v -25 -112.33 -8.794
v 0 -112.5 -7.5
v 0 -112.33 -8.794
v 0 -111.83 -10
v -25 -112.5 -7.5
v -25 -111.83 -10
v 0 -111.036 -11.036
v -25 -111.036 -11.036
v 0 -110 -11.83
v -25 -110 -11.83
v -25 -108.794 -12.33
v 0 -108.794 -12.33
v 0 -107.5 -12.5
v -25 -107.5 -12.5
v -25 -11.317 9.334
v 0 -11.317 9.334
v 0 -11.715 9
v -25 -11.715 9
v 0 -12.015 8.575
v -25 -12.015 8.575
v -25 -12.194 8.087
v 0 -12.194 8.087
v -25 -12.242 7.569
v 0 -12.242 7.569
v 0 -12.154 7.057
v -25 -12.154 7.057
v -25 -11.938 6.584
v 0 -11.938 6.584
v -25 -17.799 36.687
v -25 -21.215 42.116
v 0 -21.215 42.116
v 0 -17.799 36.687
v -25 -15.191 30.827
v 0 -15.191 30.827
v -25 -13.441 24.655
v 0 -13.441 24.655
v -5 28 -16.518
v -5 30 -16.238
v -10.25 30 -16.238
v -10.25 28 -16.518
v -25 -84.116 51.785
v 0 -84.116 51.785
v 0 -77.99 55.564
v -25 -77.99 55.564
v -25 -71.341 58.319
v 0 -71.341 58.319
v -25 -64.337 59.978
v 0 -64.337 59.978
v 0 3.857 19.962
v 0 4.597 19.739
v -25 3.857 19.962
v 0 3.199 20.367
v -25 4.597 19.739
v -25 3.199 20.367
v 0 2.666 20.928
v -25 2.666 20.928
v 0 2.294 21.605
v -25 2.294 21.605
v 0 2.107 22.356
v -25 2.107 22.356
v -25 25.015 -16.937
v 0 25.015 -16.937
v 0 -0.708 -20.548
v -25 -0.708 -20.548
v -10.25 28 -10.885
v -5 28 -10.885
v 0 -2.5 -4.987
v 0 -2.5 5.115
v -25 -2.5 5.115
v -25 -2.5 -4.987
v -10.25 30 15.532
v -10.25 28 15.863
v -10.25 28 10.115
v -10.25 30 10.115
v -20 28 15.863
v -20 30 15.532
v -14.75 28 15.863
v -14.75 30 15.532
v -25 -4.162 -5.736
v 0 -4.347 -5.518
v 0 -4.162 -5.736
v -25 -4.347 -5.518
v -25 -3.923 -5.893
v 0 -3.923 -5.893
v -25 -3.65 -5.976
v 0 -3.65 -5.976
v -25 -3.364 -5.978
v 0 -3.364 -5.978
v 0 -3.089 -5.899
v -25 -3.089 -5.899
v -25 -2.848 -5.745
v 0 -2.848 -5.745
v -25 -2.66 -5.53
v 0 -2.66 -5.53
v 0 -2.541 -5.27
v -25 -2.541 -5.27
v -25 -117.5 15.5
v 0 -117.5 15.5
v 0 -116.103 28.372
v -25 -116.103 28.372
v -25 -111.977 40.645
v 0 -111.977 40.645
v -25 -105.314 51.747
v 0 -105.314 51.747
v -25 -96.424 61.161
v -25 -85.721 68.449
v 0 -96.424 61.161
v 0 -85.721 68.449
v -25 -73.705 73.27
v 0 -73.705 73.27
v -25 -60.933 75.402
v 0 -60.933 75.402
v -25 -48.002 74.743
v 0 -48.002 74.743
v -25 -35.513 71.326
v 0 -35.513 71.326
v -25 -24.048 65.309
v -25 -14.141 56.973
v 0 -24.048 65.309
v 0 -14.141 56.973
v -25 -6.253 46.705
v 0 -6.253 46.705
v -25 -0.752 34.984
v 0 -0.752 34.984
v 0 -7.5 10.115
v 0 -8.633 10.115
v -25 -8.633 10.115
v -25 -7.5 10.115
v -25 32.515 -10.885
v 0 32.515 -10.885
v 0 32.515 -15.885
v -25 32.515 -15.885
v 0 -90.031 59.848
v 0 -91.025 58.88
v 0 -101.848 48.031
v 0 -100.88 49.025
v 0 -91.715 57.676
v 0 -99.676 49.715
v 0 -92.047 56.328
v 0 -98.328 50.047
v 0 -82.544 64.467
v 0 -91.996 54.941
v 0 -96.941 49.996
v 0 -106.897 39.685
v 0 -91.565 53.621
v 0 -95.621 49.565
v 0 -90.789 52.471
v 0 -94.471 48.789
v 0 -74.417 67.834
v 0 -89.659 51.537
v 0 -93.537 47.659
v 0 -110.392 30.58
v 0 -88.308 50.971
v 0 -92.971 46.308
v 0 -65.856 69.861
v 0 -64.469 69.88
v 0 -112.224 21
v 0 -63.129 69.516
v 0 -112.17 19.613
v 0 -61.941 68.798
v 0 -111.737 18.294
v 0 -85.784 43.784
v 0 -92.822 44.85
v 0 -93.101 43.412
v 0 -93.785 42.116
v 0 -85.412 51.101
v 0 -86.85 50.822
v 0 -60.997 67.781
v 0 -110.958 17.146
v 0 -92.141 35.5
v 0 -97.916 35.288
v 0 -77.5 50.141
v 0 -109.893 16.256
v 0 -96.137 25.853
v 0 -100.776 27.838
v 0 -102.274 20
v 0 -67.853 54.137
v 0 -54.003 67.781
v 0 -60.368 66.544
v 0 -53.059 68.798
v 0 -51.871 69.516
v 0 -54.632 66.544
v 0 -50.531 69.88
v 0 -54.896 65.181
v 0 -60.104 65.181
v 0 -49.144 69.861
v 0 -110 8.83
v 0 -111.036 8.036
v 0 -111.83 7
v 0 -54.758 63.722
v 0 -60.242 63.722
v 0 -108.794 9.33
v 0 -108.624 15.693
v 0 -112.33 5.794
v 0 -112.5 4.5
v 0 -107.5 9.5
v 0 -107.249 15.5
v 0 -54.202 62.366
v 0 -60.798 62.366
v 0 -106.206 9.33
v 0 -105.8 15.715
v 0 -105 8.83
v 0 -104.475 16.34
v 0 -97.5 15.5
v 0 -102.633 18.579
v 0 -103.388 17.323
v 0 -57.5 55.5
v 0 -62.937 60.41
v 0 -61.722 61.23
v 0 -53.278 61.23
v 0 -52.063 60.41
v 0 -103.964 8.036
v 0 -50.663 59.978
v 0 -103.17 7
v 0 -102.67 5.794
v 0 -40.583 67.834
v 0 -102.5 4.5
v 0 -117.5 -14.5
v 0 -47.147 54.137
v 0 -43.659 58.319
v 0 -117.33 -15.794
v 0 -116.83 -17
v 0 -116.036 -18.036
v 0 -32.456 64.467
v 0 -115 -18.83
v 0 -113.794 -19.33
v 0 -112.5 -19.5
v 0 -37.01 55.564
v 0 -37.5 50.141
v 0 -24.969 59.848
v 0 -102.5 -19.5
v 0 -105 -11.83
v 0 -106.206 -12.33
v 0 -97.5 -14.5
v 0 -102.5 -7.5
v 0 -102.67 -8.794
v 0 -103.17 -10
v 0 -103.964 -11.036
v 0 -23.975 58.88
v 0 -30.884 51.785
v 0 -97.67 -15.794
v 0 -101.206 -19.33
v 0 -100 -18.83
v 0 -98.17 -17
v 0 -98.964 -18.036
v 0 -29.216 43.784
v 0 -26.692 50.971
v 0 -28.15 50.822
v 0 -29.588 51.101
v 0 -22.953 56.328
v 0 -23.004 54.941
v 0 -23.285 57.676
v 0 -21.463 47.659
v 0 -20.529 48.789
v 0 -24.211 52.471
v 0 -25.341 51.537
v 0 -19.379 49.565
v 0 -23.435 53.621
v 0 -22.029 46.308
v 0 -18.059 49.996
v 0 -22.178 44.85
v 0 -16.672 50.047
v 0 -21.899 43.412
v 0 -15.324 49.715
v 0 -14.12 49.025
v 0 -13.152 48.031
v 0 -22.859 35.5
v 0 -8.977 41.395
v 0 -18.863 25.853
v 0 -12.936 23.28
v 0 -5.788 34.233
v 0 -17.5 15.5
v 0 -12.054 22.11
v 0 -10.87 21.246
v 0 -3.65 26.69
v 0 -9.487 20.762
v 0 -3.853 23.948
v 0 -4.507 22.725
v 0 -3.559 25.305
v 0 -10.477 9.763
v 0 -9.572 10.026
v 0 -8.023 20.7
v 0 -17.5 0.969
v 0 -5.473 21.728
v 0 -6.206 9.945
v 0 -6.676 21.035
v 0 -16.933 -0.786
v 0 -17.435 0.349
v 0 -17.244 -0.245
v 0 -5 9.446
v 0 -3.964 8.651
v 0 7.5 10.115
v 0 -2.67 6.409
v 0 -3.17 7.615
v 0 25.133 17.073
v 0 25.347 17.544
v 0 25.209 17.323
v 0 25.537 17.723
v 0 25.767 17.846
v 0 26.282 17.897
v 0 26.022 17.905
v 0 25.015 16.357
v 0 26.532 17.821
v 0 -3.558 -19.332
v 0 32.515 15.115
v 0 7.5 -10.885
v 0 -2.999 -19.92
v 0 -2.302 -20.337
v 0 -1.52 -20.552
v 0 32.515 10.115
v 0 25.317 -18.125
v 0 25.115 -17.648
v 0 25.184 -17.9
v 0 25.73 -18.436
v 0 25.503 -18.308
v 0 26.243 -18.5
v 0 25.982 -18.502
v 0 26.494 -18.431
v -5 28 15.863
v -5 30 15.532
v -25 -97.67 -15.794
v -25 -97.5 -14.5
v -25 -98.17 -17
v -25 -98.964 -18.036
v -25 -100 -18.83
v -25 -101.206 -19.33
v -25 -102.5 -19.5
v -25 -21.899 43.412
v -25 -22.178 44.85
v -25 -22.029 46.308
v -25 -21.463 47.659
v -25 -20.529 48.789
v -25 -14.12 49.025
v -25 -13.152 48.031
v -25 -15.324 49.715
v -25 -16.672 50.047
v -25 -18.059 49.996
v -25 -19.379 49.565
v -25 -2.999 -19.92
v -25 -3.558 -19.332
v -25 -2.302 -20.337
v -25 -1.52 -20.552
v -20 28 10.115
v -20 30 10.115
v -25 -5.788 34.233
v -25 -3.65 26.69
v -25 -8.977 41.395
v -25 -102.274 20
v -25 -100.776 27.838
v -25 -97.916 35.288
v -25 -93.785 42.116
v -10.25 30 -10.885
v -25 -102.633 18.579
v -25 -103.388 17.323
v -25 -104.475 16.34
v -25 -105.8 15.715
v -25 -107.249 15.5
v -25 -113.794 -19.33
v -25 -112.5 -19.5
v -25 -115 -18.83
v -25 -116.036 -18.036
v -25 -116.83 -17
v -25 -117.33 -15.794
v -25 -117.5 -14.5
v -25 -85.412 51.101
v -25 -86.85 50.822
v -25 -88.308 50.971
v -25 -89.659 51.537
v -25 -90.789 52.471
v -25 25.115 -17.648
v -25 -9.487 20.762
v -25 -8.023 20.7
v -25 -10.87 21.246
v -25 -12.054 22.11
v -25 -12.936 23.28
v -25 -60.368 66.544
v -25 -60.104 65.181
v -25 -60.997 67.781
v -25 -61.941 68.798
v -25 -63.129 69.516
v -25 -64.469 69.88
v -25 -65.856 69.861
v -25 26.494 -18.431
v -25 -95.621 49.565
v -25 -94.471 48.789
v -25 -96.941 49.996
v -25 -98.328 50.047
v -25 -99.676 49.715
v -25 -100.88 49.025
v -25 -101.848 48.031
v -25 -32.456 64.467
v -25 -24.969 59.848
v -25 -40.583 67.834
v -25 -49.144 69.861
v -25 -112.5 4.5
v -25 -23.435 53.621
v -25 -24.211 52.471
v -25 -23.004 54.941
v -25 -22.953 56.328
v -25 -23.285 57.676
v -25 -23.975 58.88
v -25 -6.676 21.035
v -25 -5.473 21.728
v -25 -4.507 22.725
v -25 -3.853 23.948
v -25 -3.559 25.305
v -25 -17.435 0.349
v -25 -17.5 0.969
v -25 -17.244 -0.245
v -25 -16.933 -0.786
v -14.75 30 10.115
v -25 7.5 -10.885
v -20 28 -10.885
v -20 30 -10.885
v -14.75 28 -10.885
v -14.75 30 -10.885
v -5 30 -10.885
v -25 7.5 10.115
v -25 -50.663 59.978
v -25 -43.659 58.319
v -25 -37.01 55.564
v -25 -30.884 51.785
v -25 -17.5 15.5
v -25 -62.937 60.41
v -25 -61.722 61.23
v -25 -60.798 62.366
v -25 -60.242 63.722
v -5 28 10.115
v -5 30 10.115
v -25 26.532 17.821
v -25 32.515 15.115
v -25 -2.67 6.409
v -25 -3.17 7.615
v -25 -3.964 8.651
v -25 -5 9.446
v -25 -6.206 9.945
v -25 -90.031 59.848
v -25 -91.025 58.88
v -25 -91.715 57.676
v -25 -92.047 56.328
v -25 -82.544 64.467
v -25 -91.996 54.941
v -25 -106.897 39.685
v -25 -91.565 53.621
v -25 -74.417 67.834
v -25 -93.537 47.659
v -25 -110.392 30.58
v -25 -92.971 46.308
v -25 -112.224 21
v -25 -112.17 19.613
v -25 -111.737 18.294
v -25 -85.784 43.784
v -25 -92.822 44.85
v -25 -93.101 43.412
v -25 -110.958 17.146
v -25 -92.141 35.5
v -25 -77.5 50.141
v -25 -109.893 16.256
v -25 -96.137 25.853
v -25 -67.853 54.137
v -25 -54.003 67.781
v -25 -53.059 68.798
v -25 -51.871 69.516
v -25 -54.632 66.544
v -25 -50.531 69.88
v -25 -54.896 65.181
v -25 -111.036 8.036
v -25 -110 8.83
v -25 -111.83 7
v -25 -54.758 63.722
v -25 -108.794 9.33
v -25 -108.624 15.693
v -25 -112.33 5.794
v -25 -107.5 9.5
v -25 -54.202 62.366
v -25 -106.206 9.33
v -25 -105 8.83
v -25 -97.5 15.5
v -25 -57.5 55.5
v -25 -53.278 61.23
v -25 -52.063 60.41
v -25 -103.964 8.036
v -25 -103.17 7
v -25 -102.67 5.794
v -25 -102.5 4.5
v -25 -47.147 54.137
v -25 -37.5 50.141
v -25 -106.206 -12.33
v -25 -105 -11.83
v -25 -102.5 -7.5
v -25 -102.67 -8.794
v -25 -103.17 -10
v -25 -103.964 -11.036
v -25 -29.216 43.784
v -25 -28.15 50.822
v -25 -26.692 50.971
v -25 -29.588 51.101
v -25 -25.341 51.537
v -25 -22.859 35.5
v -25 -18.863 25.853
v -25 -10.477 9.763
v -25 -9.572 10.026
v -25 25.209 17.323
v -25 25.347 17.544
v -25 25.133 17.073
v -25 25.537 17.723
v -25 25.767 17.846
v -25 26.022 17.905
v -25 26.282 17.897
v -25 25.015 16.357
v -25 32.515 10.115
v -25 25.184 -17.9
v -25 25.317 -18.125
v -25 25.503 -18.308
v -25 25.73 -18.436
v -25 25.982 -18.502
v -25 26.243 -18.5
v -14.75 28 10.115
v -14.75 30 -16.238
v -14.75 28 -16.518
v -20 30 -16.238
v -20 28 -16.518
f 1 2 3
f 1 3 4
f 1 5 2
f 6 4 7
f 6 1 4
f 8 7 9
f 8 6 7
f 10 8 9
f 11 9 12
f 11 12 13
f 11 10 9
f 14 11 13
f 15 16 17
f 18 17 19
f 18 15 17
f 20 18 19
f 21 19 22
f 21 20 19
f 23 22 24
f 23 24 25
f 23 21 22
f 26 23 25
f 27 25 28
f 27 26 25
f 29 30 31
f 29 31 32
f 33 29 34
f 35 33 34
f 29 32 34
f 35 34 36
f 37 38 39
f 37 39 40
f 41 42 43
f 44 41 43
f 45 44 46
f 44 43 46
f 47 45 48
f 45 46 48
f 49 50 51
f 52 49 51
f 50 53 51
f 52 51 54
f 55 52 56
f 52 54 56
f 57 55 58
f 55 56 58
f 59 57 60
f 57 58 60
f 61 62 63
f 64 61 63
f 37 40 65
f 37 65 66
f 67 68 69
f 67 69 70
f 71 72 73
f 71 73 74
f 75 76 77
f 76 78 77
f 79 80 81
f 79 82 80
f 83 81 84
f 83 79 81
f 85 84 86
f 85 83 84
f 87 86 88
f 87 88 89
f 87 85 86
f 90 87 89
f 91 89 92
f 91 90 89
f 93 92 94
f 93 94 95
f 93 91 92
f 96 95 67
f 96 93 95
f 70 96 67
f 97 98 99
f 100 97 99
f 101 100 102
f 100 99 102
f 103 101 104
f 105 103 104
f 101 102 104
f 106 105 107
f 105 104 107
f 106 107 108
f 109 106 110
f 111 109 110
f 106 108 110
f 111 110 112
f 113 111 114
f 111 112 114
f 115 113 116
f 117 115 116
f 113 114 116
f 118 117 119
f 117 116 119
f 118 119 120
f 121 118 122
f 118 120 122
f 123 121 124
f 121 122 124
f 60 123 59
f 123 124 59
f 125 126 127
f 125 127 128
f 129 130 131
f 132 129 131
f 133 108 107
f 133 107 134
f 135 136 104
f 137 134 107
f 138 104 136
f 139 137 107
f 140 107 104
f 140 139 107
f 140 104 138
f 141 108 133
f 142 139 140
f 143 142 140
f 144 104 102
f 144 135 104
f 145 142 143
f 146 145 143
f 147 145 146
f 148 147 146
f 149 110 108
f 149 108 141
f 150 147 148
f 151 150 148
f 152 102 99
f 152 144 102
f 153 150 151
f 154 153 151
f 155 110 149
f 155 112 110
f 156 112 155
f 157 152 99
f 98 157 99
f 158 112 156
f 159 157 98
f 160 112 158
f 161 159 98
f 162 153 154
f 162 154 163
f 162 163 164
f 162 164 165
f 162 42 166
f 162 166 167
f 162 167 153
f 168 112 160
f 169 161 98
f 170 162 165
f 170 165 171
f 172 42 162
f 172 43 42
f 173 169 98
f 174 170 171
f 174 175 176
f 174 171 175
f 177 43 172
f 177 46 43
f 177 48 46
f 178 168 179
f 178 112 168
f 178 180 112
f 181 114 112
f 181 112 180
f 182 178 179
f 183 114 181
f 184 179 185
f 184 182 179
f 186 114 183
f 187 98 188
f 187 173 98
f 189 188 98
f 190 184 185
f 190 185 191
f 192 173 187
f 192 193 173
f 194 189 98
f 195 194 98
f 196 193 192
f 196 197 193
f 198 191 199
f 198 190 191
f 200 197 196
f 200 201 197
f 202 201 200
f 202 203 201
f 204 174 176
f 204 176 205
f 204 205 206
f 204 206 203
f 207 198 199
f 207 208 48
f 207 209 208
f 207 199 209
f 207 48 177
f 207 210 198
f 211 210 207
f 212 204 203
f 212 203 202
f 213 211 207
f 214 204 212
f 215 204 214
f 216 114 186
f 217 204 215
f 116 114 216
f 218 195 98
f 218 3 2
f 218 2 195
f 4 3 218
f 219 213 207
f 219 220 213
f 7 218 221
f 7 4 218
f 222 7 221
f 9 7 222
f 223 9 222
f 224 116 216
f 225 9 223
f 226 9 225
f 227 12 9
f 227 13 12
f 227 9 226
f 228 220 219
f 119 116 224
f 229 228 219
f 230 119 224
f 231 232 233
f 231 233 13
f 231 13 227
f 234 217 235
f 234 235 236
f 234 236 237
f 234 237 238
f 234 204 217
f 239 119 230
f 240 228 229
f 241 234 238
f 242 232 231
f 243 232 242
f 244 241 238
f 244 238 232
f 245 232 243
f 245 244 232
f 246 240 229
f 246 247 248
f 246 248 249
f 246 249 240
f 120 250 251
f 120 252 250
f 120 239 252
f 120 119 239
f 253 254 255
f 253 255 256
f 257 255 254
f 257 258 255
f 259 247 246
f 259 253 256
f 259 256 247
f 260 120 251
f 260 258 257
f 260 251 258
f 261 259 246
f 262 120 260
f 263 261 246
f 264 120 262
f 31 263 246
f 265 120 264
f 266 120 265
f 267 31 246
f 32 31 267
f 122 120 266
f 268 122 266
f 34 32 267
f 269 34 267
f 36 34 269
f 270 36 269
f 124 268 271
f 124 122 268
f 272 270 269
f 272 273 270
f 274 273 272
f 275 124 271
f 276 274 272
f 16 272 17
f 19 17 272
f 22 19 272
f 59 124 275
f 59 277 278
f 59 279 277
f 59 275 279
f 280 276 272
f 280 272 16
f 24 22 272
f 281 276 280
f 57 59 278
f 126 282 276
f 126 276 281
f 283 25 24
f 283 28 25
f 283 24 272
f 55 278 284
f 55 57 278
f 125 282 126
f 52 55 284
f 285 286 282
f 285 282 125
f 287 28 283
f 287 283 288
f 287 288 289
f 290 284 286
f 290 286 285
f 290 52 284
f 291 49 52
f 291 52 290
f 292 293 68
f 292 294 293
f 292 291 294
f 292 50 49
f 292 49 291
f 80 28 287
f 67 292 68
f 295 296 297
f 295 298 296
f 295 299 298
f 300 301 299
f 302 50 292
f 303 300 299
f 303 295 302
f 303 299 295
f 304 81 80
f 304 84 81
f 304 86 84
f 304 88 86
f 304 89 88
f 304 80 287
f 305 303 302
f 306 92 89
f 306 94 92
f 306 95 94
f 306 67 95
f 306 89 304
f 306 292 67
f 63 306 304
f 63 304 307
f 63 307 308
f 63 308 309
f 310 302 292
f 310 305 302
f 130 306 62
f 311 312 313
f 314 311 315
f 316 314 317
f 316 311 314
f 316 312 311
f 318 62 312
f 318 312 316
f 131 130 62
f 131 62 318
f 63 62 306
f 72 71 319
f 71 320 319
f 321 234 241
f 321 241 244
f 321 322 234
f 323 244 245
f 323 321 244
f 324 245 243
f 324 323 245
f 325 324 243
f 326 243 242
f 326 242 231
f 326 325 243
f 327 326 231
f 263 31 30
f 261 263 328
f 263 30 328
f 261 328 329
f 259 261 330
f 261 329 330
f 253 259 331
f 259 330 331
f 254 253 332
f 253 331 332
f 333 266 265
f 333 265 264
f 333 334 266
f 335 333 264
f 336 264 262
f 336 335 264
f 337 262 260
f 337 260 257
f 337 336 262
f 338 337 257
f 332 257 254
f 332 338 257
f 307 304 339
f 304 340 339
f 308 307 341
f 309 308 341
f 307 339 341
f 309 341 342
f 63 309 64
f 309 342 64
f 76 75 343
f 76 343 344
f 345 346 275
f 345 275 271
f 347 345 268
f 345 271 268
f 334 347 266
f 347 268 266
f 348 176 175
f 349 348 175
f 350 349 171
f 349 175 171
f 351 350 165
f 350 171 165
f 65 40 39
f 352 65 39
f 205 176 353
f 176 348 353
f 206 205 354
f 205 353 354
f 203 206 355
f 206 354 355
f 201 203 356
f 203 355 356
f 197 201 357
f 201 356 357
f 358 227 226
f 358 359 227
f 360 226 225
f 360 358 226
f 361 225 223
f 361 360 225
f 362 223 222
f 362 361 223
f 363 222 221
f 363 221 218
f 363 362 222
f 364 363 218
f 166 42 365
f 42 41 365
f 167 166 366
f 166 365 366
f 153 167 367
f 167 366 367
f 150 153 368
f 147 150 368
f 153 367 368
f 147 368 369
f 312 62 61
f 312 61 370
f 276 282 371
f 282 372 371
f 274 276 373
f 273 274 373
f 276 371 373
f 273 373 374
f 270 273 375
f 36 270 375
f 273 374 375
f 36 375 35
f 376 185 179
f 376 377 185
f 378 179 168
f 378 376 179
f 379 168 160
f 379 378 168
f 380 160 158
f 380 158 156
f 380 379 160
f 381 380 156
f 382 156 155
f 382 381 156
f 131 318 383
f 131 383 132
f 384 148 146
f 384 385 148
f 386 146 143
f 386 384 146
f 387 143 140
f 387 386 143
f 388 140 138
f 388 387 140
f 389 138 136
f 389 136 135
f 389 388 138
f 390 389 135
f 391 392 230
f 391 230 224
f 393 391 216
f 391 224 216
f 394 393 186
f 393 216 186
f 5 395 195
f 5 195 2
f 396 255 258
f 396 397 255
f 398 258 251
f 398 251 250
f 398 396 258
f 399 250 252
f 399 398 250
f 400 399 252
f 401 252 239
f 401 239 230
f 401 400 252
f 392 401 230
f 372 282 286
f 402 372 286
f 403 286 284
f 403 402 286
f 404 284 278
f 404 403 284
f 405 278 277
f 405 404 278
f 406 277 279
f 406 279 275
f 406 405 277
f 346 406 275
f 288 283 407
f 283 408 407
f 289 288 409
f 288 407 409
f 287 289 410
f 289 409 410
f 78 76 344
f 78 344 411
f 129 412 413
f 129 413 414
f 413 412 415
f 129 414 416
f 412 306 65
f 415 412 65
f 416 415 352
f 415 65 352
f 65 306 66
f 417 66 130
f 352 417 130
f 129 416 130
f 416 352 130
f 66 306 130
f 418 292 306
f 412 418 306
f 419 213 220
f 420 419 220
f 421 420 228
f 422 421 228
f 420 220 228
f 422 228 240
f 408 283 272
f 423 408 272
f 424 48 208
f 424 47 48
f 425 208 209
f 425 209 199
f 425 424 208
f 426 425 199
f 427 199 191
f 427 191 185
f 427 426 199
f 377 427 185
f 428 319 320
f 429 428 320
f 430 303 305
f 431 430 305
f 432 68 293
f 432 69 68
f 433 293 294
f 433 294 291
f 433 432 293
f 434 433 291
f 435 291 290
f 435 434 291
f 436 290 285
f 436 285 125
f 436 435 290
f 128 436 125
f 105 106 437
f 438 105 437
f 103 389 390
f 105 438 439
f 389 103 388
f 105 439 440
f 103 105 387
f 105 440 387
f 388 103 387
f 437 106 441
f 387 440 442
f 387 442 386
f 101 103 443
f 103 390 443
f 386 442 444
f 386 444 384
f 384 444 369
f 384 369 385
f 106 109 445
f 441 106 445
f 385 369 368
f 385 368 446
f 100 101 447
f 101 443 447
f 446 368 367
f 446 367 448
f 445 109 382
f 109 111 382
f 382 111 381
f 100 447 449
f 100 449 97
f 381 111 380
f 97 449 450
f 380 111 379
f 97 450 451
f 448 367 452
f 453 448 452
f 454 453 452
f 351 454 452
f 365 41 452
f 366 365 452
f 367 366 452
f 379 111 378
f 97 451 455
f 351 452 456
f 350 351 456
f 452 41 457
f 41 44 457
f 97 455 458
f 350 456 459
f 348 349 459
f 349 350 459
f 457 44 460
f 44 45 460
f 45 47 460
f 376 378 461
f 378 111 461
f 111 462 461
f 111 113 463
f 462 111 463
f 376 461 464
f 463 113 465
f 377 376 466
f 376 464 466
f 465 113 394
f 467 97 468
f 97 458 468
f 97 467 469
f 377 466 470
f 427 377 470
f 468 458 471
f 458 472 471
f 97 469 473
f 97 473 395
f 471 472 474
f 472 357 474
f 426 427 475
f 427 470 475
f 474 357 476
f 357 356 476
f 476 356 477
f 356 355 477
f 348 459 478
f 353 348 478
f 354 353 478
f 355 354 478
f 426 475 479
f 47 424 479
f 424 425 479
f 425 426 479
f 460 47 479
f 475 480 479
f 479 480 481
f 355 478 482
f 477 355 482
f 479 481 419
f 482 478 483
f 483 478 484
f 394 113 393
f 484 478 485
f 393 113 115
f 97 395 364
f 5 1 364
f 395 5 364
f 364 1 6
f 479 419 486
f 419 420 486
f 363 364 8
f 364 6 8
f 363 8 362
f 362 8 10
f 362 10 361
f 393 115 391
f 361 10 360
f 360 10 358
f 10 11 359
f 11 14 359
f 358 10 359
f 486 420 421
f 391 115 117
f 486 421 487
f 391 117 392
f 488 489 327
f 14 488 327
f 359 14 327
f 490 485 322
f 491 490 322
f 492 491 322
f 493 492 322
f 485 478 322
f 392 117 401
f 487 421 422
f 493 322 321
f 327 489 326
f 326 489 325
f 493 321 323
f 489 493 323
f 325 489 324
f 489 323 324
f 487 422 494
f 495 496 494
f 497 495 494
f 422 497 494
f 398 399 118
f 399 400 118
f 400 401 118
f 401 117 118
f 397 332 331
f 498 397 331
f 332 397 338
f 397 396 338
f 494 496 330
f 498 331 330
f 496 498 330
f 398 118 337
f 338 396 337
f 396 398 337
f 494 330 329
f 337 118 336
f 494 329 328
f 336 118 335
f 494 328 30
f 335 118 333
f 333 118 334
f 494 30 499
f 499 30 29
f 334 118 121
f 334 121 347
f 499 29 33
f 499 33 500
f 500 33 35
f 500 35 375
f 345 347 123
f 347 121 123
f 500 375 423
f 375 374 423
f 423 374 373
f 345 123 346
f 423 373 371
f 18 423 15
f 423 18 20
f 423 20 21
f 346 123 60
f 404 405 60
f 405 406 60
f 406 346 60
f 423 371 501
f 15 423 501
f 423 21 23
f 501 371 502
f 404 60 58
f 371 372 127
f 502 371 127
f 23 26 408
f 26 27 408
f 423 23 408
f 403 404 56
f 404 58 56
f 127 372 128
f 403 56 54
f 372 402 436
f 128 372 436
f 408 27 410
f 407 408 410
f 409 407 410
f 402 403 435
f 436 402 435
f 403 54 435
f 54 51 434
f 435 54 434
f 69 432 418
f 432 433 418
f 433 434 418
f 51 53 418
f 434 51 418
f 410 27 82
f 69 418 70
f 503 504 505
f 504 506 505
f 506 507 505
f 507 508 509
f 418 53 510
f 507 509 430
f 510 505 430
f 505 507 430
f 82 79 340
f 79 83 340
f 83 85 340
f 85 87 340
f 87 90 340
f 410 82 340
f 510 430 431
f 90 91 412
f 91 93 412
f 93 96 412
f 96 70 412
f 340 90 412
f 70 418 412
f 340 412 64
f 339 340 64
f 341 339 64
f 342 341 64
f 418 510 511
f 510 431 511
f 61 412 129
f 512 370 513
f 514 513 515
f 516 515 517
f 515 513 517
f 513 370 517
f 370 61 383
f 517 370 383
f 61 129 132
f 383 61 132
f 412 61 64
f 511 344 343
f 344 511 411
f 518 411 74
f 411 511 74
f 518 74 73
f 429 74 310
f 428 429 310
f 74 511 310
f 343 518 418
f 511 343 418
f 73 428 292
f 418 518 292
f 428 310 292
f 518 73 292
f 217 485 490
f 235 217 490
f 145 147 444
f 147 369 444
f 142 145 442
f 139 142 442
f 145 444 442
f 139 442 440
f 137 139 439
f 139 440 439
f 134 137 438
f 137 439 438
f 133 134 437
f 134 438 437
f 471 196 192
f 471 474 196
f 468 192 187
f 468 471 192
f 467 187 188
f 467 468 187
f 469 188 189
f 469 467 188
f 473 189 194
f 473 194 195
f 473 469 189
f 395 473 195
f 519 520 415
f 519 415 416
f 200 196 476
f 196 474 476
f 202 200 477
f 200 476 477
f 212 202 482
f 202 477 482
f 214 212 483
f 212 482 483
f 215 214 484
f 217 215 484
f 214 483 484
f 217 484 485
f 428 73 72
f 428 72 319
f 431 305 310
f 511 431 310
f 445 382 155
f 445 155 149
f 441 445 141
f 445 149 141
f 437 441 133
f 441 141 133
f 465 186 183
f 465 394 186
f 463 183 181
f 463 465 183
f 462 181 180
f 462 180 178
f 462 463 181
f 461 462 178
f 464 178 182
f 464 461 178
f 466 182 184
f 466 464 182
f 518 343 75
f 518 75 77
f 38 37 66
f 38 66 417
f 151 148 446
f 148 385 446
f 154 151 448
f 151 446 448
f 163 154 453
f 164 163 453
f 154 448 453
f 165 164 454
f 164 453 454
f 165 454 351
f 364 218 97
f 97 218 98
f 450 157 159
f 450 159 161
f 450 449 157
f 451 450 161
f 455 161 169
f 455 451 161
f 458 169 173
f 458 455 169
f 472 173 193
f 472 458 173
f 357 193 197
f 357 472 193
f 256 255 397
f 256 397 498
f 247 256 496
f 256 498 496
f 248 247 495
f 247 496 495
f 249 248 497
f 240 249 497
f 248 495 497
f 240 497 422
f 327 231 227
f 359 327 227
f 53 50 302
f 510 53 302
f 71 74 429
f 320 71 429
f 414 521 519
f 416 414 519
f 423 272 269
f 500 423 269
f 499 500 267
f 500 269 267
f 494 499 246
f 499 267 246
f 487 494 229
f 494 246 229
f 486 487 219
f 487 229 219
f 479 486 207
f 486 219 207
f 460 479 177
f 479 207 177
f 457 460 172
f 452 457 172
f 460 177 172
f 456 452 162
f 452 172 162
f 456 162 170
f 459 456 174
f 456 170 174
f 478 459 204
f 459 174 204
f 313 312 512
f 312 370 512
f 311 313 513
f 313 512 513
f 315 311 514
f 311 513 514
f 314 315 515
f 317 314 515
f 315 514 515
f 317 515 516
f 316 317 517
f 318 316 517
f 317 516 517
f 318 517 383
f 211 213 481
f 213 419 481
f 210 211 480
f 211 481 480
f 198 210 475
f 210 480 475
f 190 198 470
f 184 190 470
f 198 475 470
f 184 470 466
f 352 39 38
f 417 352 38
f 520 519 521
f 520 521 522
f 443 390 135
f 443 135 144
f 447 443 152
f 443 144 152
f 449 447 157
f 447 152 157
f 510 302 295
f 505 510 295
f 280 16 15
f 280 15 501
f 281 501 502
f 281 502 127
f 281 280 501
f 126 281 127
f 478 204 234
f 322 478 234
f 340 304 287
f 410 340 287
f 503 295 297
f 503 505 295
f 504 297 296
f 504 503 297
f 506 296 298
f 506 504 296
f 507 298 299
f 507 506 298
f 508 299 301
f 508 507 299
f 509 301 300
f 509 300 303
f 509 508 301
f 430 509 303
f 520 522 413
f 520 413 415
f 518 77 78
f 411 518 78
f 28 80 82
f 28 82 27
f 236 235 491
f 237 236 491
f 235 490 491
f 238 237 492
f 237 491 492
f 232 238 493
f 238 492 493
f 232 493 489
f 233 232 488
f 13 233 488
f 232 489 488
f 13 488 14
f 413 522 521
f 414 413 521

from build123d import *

# Parameters (mm, degrees)
SKETCH1_W               = 22
SKETCH1_H               = 10
BOSS_EXTRUDE1_DEPTH     = 25
FILLET1_R               = 5
FILLET2_R               = 5
FILLET3_R               = 5
FILLET4_R               = 5
FILLET5_R               = 2
FILLET6_R               = 1
FILLET7_R               = 3
FILLET8_R               = 5
CUT_EXTRUDE1_DEPTH      = 35
CUT_EXTRUDE1_DEPTH_BACK = 25
SKETCH2_W               = 5.25
SKETCH2_H               = 2
BOSS_EXTRUDE2_DEPTH     = 25
FILLET9_R               = 1


# Some blends are built 0.0001 mm under size
with BuildPart() as part:
    # Sketch1 → Boss-Extrude1 (new body)
    with BuildSketch(Plane(origin=(0, 0, 0), x_dir=(0, 0, -1), z_dir=(1, 0, 0))):
        with BuildLine():
            ThreePointArc((-15.5, -17.5), (-55.5, -57.5), (-15.5, -97.5))
            Line((-15.5, -97.5), (19.5, -97.5))
            Line((19.5, -97.5), (19.5, -117.5))
            Line((19.5, -117.5), (-15.5, -117.5))
            ThreePointArc((-15.5, -117.5), (-75.455538985, -59.809403615), (-20.115384615, 2.322221831))
            Line((-20.115384615, 2.322221831), (-15.115384615, 32.514814847))
            Line((-15.115384615, 32.514814847), (-10.115384615, 32.514814847))
            Line((-10.115384615, 32.514814847), (-10.115384615, 7.5))
            Line((-10.115384615, 7.5), (10.884615385, 7.5))
            Line((10.884615385, 7.5), (10.884615385, 32.514814847))
            Line((10.884615385, 32.514814847), (15.884615385, 32.514814847))
            Line((15.884615385, 32.514814847), (20.8, -2.5))
            Line((20.8, -2.5), (0, -17.5))
            Line((0, -17.5), (-15.5, -17.5))
        make_face()
        with BuildLine():
            ThreePointArc((-52.30218335, -98.372965401), (-35.210237225, -108.846923457), (-15.5, -112.5))
            Line((-15.5, -112.5), (-15.5, -102.5))
            ThreePointArc((-15.5, -102.5), (-31.62655773, -99.511119192), (-45.610877286, -90.941517146))
            Line((-45.610877286, -90.941517146), (-52.30218335, -98.372965401))
        make_face(mode=Mode.SUBTRACT)
        with BuildLine():
            ThreePointArc((-56.372965401, -20.69781665), (-66.313374288, -36.45241122), (-70.424624412, -54.621522407))
            Line((-70.424624412, -54.621522407), (-60.438329064, -55.144881969))
            ThreePointArc((-60.438329064, -55.144881969), (-57.074578963, -40.279245544), (-48.941517146, -27.389122714))
            Line((-48.941517146, -27.389122714), (-56.372965401, -20.69781665))
        make_face(mode=Mode.SUBTRACT)
        with BuildLine():
            ThreePointArc((-21.24906548, -2.801295755), (-37.870515369, -7.25499983), (-52.30218335, -16.627034599))
            Line((-52.30218335, -16.627034599), (-45.610877286, -24.058482854))
            ThreePointArc((-45.610877286, -24.058482854), (-33.803148938, -16.390454406), (-20.203780847, -12.746514708))
            Line((-20.203780847, -12.746514708), (-21.24906548, -2.801295755))
        make_face(mode=Mode.SUBTRACT)
        Polygon((8.463652775, -2.5), (-7.917479229, -12.773905232), (-10.115384615, -12.773905232), (-10.115384615, -2.5), align=None, mode=Mode.SUBTRACT)
        with Locations((1.5, -107.5)):
            Rectangle(SKETCH1_W, SKETCH1_H, mode=Mode.SUBTRACT)
        with BuildLine():
            Line((-60.438329064, -59.855118031), (-70.424624412, -60.378477593))
            ThreePointArc((-70.424624412, -60.378477593), (-66.313374288, -78.54758878), (-56.372965401, -94.30218335))
            Line((-56.372965401, -94.30218335), (-48.941517146, -87.610877286))
            ThreePointArc((-48.941517146, -87.610877286), (-57.074578963, -74.720754456), (-60.438329064, -59.855118031))
        make_face(mode=Mode.SUBTRACT)
    extrude(amount=-BOSS_EXTRUDE1_DEPTH)

    # Fillet1
    fillet1_edges = [part.edges().sort_by_distance(p)[0] for p in [
        (-12.5, -90.941517146, 45.610877286),
        (-12.5, -102.5, 9.5),
        (-12.5, -112.5, 9.5),
        (-12.5, -112.5, 15.5),
        (-12.5, -112.5, -12.5),
        (-12.5, -102.5, -12.5),
        (-12.5, -98.372965401, 52.30218335),
        (-12.5, -102.5, 15.5),
        (-12.5, -87.610877286, 48.941517146),
        (-12.5, -94.30218335, 56.372965401),
        (-12.5, -20.69781665, 56.372965401),
        (-12.5, -27.389122714, 48.941517146),
        (-12.5, -55.144881969, 60.438329064),
        (-12.5, -54.621522407, 70.424624412),
        (-12.5, -16.627034599, 52.30218335),
        (-12.5, -24.058482854, 45.610877286),
        (-12.5, -12.746514708, 20.203780847),
        (-12.5, -2.801295755, 21.24906548),
    ]]
    fillet(fillet1_edges, radius=FILLET1_R - 0.0001)  # a hair under: the kernel refuses the full size

    # Fillet2
    fillet2_edges = [part.edges().sort_by_distance(p)[0] for p in [
        (-12.5, -59.855118031, 60.438329064),
        (-12.5, -60.378477593, 70.424624412),
    ]]
    fillet(fillet2_edges, radius=FILLET2_R - 0.0001)  # a hair under: the kernel refuses the full size

    # Fillet3
    fillet3_edges = [part.edges().sort_by_distance(p)[0] for p in [
        (-12.5, -2.5, 10.115384615),
    ]]
    fillet(fillet3_edges, radius=FILLET3_R)

    # Fillet4
    # the kernel refuses this fillet: 5 mm, written as the material it adds along each edge
    with BuildSketch(Plane(origin=(0, -12.773905232, 10.115384615), x_dir=(0, 1, 0), z_dir=(-1, 0, 0))) as fillet4_piece_1:
        with BuildLine():
            CenterArc((4.141046459, 5), FILLET4_R, 214.08477399, 55.91522601)
            Line((0, 2.197905387), (-0.082820929, 2.141863494))
            ThreePointArc((-0.082820929, 2.141863494), (-0.1, 1.098952693), (-0.1, 0))
            Line((-0.1, 0), (0, -0.1))
            Line((0, -0.1), (4.141046459, -0.1))
            Line((4.141046459, -0.1), (4.141046459, 0))
        make_face()
    extrude(amount=25)

    # Fillet5
    fillet5_edges = [part.edges().sort_by_distance(p)[0] for p in [
        (-12.5, -12.773905232, 7.917479229),
    ]]
    fillet(fillet5_edges, radius=FILLET5_R)

    # Fillet6
    fillet6_edges = [part.edges().sort_by_distance(p)[0] for p in [
        (-12.5, -2.5, -8.463652775),
    ]]
    fillet(fillet6_edges, radius=FILLET6_R)

    # Fillet7
    fillet7_edges = [part.edges().sort_by_distance(p)[0] for p in [
        (-12.5, 2.322221831, 20.115384615),
        (-12.5, -2.5, -20.8),
        (-12.5, -17.5, 0),
    ]]
    fillet(fillet7_edges, radius=FILLET7_R)

    # Fillet8
    fillet8_edges = [part.edges().sort_by_distance(p)[0] for p in [
        (-12.5, -97.5, -19.5),
        (-12.5, -117.5, -19.5),
    ]]
    fillet(fillet8_edges, radius=FILLET8_R)

    # Sketch2 → Cut-Extrude1 (cut, two sides: drawn at the far end of the back side and taken through both)
    with BuildSketch(Plane.XY.offset(-10.884615385).offset(-CUT_EXTRUDE1_DEPTH_BACK)):
        with Locations((-17.375, 29)):
            Rectangle(SKETCH2_W, SKETCH2_H)
        with Locations((-7.625, 29)):
            Rectangle(SKETCH2_W, SKETCH2_H)
    extrude(amount=CUT_EXTRUDE1_DEPTH + CUT_EXTRUDE1_DEPTH_BACK, mode=Mode.SUBTRACT)

    # Sketch3 → Boss-Extrude2 (add)
    with BuildSketch(Plane(origin=(0, 0, 0), x_dir=(0, 0, -1), z_dir=(1, 0, 0))):
        Polygon((16.937466436, 25.014814847), (18.937466436, 25.295575128), (15.884615385, 32.514814847), align=None)
        Polygon((-16.357411095, 25.014814847), (-18.357411095, 25.346021908), (-15.115384615, 32.514814847), align=None)
    extrude(amount=-BOSS_EXTRUDE2_DEPTH)

    # Fillet9
    fillet9_edges = [part.edges().sort_by_distance(p)[0] for p in [
        (-12.5, 25.295575128, -18.937466436),
        (-12.5, 25.346021908, 18.357411095),
    ]]
    fillet(fillet9_edges, radius=FILLET9_R)


solid = part.part
